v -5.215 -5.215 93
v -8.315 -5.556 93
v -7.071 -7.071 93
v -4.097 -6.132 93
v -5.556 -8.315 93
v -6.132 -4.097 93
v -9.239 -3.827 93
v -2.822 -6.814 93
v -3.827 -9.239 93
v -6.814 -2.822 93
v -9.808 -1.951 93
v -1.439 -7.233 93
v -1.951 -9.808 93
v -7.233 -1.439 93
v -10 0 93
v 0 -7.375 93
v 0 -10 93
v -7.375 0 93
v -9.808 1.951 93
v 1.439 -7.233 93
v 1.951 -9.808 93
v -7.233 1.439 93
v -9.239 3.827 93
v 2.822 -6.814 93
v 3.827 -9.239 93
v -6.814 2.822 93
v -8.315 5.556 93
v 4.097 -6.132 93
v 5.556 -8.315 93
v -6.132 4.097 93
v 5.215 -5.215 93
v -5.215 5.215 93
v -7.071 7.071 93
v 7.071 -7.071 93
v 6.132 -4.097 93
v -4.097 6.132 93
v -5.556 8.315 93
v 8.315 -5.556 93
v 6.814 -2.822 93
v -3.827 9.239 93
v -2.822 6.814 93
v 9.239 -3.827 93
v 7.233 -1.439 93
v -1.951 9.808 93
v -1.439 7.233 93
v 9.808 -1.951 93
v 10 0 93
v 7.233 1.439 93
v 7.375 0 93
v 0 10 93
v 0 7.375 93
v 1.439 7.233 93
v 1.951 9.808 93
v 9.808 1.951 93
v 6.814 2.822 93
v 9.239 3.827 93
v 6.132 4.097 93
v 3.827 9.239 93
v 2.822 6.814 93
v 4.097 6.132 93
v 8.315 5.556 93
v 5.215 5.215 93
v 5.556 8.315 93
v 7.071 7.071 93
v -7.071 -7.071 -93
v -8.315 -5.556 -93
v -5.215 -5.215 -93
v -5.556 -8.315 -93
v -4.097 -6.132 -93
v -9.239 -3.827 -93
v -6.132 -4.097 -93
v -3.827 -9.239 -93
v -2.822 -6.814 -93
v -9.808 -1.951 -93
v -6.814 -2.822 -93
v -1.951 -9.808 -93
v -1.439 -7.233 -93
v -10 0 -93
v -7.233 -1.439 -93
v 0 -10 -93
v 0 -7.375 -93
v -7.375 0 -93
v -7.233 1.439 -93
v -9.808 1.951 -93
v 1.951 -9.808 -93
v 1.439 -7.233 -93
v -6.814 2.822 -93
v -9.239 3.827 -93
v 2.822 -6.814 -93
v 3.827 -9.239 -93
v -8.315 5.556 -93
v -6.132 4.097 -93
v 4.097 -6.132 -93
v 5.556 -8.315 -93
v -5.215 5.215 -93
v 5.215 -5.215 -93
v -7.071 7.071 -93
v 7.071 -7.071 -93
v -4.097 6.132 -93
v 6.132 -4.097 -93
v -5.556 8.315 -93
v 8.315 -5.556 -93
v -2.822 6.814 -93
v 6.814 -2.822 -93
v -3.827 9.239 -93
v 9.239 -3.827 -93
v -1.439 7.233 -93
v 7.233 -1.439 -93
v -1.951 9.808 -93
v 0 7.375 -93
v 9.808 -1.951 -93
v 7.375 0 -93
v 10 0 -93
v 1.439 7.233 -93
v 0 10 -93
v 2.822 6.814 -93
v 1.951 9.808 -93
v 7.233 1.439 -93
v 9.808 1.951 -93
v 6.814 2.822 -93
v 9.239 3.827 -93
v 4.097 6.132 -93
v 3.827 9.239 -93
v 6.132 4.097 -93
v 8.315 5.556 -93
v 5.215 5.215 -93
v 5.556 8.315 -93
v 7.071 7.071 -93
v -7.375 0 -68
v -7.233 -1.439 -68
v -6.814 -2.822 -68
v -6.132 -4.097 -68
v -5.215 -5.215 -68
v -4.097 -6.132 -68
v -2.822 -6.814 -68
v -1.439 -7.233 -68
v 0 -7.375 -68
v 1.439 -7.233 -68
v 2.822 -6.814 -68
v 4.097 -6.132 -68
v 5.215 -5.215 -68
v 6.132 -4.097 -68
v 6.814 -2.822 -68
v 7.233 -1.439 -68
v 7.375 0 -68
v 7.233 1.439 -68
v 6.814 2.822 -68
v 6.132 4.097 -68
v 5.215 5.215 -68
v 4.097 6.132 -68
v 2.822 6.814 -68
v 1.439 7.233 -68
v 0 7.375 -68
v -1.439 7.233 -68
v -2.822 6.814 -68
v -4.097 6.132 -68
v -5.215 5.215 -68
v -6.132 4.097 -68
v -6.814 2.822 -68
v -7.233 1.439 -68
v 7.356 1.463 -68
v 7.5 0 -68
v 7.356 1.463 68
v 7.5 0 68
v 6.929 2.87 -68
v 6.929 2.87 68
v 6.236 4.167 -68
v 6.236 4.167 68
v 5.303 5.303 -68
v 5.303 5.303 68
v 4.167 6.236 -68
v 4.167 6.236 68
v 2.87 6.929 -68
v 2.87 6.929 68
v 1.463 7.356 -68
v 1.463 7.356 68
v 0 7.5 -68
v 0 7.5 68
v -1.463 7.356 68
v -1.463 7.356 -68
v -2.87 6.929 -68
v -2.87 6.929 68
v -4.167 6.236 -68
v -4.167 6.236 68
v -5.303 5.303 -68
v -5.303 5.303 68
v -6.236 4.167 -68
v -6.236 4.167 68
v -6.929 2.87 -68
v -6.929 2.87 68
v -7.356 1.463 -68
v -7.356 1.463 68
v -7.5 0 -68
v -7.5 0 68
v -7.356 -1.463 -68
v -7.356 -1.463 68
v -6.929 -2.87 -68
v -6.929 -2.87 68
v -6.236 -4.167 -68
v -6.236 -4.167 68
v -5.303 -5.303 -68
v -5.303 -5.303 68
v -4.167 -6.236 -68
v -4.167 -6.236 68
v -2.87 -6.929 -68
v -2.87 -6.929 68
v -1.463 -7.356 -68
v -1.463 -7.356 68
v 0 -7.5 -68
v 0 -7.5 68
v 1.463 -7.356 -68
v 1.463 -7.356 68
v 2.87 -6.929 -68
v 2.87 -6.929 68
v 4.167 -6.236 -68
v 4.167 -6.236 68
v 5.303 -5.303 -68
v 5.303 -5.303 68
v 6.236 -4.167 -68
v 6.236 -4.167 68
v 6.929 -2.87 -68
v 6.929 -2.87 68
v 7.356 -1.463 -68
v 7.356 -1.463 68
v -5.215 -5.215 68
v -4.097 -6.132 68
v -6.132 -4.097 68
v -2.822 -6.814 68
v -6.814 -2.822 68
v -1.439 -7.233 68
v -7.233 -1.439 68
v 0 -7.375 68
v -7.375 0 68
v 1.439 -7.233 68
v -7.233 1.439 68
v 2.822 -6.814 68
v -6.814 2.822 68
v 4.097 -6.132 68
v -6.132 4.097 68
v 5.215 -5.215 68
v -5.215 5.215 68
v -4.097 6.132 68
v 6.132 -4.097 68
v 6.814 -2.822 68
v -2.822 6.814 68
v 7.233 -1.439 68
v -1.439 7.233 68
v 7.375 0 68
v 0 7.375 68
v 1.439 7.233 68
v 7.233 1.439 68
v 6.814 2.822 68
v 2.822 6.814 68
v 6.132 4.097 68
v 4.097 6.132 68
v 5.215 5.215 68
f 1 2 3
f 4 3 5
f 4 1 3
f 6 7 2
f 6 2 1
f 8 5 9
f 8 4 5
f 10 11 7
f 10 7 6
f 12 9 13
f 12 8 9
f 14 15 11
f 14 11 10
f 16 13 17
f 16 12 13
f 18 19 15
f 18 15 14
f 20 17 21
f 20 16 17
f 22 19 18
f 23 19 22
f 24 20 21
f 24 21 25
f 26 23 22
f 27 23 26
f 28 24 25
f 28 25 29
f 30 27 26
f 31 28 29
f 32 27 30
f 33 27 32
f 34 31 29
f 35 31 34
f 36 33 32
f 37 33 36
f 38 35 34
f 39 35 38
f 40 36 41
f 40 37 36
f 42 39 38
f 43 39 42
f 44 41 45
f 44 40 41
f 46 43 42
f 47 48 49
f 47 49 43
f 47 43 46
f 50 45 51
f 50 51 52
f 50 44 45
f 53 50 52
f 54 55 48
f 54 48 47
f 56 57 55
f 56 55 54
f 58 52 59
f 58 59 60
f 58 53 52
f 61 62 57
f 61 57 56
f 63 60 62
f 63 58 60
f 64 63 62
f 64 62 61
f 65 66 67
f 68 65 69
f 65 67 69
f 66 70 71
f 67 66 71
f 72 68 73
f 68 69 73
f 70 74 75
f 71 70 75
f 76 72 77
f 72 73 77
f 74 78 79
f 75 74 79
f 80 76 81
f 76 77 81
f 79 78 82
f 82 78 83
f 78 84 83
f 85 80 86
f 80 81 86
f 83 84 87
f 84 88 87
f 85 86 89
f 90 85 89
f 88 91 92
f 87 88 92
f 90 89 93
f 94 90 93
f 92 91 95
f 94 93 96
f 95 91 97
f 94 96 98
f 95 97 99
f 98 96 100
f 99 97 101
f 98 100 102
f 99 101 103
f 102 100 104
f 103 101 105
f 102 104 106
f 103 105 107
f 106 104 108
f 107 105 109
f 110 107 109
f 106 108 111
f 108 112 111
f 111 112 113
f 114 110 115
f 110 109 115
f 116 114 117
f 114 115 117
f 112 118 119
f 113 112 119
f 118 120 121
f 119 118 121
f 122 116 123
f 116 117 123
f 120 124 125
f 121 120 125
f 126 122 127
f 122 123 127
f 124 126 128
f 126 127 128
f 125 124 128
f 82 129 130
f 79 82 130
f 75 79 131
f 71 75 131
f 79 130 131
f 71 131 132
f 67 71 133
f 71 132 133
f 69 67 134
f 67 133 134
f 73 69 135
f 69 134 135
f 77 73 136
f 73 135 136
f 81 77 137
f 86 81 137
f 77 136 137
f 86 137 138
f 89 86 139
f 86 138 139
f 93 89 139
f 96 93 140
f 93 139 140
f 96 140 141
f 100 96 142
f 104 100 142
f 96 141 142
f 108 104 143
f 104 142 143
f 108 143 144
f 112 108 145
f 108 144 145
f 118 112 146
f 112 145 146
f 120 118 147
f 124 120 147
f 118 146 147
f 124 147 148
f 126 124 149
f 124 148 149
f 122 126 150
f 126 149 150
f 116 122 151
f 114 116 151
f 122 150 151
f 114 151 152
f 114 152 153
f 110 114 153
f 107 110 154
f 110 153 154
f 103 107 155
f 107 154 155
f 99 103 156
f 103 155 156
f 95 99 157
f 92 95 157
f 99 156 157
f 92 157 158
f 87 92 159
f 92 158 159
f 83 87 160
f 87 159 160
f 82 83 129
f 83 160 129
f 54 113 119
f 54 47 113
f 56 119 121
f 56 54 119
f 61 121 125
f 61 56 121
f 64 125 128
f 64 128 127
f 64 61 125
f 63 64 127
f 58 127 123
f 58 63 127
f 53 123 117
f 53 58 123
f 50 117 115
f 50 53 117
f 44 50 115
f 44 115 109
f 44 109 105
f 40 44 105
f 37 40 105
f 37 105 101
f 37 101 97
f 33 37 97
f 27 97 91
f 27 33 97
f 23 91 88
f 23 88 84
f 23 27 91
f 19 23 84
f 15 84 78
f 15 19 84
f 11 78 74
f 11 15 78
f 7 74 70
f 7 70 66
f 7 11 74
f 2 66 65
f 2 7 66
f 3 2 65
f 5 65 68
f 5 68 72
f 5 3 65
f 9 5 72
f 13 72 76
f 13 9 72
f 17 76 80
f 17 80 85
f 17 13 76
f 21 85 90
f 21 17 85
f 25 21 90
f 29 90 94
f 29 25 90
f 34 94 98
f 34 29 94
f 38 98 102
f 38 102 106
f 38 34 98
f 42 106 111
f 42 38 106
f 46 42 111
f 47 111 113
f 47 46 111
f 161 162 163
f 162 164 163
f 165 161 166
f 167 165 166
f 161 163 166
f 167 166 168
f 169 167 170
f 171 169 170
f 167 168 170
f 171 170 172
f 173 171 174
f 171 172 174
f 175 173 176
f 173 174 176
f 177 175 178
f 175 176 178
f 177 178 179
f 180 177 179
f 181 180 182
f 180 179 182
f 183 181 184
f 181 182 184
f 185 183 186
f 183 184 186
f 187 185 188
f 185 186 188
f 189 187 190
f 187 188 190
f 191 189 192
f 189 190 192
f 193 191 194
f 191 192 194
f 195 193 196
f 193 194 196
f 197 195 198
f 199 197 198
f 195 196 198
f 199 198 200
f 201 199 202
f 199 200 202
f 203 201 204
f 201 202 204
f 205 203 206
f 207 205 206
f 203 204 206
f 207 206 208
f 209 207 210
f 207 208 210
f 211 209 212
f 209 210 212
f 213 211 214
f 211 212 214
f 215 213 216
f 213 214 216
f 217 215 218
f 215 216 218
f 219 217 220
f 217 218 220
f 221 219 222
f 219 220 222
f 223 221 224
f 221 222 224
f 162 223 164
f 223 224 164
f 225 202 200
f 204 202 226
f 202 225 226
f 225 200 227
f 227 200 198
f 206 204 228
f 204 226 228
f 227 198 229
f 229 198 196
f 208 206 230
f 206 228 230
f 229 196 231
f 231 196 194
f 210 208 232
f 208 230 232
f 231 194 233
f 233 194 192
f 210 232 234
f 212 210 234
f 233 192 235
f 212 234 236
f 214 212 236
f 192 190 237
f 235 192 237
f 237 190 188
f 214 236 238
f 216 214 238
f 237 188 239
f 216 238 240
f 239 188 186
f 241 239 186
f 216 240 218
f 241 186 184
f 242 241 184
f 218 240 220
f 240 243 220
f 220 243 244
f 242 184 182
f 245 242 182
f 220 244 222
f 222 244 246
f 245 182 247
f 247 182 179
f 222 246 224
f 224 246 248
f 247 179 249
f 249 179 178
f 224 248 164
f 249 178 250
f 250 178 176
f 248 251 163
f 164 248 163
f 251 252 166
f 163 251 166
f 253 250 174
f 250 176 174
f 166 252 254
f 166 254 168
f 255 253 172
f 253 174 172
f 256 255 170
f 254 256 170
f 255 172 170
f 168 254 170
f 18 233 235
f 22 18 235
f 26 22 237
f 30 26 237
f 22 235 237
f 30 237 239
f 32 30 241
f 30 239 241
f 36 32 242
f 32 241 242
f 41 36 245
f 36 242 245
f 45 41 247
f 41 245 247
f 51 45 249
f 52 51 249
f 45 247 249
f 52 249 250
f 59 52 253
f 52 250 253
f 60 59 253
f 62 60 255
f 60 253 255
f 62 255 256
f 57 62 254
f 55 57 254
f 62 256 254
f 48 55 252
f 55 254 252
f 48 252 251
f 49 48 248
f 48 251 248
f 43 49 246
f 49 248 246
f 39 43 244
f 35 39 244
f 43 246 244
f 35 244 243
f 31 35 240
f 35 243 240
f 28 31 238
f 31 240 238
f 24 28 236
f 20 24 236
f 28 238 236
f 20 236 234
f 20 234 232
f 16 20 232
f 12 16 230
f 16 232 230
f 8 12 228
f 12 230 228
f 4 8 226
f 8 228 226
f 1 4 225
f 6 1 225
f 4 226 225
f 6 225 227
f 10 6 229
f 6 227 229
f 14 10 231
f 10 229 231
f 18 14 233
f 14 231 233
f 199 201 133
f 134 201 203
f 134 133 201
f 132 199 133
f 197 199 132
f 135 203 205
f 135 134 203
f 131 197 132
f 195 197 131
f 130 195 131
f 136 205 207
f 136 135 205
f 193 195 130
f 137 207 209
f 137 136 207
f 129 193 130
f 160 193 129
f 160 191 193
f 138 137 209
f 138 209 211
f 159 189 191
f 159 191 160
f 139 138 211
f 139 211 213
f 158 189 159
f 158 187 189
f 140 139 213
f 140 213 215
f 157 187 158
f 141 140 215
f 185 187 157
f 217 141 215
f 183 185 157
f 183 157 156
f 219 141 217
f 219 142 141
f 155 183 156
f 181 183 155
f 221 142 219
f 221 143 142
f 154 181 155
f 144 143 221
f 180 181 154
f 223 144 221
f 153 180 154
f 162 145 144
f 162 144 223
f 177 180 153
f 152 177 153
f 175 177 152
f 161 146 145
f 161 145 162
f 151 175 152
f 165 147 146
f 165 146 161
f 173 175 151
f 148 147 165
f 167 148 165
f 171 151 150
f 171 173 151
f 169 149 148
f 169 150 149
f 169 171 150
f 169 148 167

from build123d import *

# Parameters (mm, degrees)
F0_R           = 10
F1_DEPTH       = 93
F4_D           = 14.75
F4_DEPTH       = 31
F4_TIP         = 4.4313470653
F4_ON_F2_D     = 14.75
F4_ON_F2_DEPTH = 31
F4_ON_F2_TIP   = 4.4313470653
F5_R           = 7.5
F6_DEPTH       = 68


with BuildPart() as f1:
    # F0 (on Top) → F1 (new body, symmetric)
    with BuildSketch(Plane.XY):
        Circle(F0_R)
    extrude(amount=F1_DEPTH, both=True)

    # F4
    with Locations(Plane.XY.offset(93)):
        with Locations((0, 0)):
            Hole(F4_D / 2, depth=F4_DEPTH)
            with Locations((0, 0, -(F4_DEPTH + F4_TIP / 2))):  # 118° drill point
                Cone(0, F4_D / 2, F4_TIP, mode=Mode.SUBTRACT)

    # F4 on F2
    with Locations(Plane(origin=(0, 0, -93), x_dir=(1, 0, 0), z_dir=(0, 0, -1))):
        with Locations((0, 0)):
            Hole(F4_ON_F2_D / 2, depth=F4_ON_F2_DEPTH)
            with Locations((0, 0, -(F4_ON_F2_DEPTH + F4_ON_F2_TIP / 2))):  # 118° drill point
                Cone(0, F4_ON_F2_D / 2, F4_ON_F2_TIP, mode=Mode.SUBTRACT)

    # F5 (on Top) → F6 (cut, symmetric)
    with BuildSketch(Plane.XY):
        Circle(F5_R)
    extrude(amount=F6_DEPTH, both=True, mode=Mode.SUBTRACT)


solid = f1.part
